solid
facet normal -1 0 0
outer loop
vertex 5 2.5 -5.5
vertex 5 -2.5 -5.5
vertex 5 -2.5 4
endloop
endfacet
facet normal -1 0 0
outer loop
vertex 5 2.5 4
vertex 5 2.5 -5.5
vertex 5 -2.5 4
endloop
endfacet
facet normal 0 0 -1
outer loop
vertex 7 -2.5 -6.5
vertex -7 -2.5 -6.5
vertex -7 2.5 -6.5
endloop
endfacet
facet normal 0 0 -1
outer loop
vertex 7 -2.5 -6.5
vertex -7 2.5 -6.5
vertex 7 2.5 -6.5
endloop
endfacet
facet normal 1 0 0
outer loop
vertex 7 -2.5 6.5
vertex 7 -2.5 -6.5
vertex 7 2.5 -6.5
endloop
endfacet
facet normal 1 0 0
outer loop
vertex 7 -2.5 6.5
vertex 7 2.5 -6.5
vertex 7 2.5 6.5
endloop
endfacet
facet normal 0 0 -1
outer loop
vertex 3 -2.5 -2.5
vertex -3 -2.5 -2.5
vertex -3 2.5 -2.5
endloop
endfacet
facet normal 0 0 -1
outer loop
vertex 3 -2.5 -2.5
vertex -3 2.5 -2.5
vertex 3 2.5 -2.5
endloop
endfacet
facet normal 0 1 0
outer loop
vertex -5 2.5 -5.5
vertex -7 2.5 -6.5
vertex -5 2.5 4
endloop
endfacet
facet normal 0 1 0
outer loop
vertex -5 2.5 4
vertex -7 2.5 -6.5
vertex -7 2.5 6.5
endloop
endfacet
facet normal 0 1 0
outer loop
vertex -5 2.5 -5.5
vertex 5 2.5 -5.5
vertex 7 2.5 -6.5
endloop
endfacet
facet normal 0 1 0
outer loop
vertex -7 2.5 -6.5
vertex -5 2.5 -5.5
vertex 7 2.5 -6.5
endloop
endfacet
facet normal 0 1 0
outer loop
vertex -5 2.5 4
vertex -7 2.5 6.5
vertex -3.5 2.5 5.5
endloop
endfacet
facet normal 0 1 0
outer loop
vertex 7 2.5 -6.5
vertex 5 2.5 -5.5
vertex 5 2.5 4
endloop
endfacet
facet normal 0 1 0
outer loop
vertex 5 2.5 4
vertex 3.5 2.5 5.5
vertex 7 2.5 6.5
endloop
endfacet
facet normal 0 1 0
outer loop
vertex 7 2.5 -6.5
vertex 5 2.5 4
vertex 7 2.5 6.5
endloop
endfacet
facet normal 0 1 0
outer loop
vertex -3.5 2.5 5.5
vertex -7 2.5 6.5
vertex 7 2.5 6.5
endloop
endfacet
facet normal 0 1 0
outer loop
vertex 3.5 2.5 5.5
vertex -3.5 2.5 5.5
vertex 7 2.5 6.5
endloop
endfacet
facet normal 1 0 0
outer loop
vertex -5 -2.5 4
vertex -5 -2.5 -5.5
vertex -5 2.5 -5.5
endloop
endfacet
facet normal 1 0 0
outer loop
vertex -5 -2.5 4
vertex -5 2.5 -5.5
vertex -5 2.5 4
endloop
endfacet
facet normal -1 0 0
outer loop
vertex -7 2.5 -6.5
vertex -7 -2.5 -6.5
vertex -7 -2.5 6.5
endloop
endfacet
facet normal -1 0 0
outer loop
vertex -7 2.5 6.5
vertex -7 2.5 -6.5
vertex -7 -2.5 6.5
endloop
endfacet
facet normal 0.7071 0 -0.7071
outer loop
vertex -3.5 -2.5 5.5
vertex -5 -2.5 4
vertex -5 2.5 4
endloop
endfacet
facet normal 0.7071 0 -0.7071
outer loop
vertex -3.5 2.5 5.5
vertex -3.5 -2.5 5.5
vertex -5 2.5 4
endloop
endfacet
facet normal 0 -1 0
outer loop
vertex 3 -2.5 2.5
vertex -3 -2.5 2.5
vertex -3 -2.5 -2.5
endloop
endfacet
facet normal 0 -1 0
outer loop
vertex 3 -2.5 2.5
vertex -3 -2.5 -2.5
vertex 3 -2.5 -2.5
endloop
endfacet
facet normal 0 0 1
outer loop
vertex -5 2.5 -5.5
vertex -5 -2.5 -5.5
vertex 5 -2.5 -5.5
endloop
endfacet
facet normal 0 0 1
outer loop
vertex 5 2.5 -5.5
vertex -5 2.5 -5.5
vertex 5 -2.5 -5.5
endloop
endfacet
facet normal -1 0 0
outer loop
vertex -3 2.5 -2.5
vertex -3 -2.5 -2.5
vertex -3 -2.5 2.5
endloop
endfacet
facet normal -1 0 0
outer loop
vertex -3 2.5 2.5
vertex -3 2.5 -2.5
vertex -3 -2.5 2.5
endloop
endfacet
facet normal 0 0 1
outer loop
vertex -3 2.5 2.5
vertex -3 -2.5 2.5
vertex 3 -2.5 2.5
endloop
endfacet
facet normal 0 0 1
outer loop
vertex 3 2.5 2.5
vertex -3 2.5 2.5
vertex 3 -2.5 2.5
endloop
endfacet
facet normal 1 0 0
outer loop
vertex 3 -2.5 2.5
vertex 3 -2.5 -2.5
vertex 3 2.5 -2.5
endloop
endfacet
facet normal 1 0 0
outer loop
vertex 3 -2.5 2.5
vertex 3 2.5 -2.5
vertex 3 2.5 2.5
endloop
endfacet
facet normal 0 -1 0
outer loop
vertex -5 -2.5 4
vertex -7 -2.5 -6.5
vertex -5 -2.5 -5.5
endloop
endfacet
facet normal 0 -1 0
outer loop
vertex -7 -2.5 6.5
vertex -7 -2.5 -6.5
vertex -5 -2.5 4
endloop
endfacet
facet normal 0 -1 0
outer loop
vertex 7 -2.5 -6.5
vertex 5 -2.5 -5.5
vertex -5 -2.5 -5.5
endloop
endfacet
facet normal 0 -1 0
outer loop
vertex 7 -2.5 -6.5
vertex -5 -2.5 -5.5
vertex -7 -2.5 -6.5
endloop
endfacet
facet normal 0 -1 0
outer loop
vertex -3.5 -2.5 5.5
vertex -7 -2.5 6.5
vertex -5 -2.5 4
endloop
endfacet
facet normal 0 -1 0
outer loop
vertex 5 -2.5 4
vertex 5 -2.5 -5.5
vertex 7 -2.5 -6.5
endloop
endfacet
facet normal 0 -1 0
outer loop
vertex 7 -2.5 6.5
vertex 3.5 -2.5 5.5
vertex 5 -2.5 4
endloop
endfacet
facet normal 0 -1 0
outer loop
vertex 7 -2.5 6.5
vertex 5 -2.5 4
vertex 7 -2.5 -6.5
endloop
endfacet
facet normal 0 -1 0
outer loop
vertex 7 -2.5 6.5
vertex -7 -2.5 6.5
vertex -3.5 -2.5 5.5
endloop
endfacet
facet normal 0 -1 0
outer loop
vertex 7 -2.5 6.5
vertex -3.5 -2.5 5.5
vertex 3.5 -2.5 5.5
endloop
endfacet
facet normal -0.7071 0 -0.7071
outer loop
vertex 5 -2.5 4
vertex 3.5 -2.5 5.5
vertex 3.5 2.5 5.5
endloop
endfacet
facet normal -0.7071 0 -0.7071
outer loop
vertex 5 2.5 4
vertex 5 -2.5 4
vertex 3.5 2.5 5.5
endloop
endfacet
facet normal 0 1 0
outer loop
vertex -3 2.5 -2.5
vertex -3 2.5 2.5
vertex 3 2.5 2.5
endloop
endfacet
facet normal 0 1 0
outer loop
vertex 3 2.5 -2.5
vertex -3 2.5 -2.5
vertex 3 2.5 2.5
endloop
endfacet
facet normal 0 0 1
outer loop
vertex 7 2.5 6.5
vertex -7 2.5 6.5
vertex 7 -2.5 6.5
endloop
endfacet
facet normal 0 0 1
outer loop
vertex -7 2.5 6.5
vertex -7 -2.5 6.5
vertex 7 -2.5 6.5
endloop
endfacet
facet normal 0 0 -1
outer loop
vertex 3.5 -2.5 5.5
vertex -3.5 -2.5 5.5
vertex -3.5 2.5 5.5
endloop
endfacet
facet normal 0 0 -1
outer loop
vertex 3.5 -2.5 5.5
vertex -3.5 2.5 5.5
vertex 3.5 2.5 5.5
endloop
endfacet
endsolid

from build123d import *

# Parameters (mm, degrees)
F0_W     = 14
F0_H     = 13
F1_DEPTH = 2.5
F2_W     = 10
F2_H     = 11
F2_W_2   = 6
F2_H_2   = 5
F3_DEPTH = 5.001
F4_SIZE  = 1.5


with BuildPart() as f1:
    # F0 (on Front) → F1 (new body, symmetric)
    with BuildSketch(Plane.XZ):
        Rectangle(F0_W, F0_H)
    extrude(amount=F1_DEPTH, both=True)

    # F2 (on face) → F3 (cut, through all)
    with BuildSketch(Plane.XZ.offset(2.5)):
        Rectangle(F2_W, F2_H)
        Rectangle(F2_W_2, F2_H_2, mode=Mode.SUBTRACT)
    extrude(amount=-F3_DEPTH, mode=Mode.SUBTRACT)

    # F4
    f4_edges = [f1.edges().sort_by_distance(p)[0] for p in [
        (-5, 0, 5.5),
        (5, 0, 5.5),
    ]]
    chamfer(f4_edges, length=F4_SIZE)


solid = f1.part
